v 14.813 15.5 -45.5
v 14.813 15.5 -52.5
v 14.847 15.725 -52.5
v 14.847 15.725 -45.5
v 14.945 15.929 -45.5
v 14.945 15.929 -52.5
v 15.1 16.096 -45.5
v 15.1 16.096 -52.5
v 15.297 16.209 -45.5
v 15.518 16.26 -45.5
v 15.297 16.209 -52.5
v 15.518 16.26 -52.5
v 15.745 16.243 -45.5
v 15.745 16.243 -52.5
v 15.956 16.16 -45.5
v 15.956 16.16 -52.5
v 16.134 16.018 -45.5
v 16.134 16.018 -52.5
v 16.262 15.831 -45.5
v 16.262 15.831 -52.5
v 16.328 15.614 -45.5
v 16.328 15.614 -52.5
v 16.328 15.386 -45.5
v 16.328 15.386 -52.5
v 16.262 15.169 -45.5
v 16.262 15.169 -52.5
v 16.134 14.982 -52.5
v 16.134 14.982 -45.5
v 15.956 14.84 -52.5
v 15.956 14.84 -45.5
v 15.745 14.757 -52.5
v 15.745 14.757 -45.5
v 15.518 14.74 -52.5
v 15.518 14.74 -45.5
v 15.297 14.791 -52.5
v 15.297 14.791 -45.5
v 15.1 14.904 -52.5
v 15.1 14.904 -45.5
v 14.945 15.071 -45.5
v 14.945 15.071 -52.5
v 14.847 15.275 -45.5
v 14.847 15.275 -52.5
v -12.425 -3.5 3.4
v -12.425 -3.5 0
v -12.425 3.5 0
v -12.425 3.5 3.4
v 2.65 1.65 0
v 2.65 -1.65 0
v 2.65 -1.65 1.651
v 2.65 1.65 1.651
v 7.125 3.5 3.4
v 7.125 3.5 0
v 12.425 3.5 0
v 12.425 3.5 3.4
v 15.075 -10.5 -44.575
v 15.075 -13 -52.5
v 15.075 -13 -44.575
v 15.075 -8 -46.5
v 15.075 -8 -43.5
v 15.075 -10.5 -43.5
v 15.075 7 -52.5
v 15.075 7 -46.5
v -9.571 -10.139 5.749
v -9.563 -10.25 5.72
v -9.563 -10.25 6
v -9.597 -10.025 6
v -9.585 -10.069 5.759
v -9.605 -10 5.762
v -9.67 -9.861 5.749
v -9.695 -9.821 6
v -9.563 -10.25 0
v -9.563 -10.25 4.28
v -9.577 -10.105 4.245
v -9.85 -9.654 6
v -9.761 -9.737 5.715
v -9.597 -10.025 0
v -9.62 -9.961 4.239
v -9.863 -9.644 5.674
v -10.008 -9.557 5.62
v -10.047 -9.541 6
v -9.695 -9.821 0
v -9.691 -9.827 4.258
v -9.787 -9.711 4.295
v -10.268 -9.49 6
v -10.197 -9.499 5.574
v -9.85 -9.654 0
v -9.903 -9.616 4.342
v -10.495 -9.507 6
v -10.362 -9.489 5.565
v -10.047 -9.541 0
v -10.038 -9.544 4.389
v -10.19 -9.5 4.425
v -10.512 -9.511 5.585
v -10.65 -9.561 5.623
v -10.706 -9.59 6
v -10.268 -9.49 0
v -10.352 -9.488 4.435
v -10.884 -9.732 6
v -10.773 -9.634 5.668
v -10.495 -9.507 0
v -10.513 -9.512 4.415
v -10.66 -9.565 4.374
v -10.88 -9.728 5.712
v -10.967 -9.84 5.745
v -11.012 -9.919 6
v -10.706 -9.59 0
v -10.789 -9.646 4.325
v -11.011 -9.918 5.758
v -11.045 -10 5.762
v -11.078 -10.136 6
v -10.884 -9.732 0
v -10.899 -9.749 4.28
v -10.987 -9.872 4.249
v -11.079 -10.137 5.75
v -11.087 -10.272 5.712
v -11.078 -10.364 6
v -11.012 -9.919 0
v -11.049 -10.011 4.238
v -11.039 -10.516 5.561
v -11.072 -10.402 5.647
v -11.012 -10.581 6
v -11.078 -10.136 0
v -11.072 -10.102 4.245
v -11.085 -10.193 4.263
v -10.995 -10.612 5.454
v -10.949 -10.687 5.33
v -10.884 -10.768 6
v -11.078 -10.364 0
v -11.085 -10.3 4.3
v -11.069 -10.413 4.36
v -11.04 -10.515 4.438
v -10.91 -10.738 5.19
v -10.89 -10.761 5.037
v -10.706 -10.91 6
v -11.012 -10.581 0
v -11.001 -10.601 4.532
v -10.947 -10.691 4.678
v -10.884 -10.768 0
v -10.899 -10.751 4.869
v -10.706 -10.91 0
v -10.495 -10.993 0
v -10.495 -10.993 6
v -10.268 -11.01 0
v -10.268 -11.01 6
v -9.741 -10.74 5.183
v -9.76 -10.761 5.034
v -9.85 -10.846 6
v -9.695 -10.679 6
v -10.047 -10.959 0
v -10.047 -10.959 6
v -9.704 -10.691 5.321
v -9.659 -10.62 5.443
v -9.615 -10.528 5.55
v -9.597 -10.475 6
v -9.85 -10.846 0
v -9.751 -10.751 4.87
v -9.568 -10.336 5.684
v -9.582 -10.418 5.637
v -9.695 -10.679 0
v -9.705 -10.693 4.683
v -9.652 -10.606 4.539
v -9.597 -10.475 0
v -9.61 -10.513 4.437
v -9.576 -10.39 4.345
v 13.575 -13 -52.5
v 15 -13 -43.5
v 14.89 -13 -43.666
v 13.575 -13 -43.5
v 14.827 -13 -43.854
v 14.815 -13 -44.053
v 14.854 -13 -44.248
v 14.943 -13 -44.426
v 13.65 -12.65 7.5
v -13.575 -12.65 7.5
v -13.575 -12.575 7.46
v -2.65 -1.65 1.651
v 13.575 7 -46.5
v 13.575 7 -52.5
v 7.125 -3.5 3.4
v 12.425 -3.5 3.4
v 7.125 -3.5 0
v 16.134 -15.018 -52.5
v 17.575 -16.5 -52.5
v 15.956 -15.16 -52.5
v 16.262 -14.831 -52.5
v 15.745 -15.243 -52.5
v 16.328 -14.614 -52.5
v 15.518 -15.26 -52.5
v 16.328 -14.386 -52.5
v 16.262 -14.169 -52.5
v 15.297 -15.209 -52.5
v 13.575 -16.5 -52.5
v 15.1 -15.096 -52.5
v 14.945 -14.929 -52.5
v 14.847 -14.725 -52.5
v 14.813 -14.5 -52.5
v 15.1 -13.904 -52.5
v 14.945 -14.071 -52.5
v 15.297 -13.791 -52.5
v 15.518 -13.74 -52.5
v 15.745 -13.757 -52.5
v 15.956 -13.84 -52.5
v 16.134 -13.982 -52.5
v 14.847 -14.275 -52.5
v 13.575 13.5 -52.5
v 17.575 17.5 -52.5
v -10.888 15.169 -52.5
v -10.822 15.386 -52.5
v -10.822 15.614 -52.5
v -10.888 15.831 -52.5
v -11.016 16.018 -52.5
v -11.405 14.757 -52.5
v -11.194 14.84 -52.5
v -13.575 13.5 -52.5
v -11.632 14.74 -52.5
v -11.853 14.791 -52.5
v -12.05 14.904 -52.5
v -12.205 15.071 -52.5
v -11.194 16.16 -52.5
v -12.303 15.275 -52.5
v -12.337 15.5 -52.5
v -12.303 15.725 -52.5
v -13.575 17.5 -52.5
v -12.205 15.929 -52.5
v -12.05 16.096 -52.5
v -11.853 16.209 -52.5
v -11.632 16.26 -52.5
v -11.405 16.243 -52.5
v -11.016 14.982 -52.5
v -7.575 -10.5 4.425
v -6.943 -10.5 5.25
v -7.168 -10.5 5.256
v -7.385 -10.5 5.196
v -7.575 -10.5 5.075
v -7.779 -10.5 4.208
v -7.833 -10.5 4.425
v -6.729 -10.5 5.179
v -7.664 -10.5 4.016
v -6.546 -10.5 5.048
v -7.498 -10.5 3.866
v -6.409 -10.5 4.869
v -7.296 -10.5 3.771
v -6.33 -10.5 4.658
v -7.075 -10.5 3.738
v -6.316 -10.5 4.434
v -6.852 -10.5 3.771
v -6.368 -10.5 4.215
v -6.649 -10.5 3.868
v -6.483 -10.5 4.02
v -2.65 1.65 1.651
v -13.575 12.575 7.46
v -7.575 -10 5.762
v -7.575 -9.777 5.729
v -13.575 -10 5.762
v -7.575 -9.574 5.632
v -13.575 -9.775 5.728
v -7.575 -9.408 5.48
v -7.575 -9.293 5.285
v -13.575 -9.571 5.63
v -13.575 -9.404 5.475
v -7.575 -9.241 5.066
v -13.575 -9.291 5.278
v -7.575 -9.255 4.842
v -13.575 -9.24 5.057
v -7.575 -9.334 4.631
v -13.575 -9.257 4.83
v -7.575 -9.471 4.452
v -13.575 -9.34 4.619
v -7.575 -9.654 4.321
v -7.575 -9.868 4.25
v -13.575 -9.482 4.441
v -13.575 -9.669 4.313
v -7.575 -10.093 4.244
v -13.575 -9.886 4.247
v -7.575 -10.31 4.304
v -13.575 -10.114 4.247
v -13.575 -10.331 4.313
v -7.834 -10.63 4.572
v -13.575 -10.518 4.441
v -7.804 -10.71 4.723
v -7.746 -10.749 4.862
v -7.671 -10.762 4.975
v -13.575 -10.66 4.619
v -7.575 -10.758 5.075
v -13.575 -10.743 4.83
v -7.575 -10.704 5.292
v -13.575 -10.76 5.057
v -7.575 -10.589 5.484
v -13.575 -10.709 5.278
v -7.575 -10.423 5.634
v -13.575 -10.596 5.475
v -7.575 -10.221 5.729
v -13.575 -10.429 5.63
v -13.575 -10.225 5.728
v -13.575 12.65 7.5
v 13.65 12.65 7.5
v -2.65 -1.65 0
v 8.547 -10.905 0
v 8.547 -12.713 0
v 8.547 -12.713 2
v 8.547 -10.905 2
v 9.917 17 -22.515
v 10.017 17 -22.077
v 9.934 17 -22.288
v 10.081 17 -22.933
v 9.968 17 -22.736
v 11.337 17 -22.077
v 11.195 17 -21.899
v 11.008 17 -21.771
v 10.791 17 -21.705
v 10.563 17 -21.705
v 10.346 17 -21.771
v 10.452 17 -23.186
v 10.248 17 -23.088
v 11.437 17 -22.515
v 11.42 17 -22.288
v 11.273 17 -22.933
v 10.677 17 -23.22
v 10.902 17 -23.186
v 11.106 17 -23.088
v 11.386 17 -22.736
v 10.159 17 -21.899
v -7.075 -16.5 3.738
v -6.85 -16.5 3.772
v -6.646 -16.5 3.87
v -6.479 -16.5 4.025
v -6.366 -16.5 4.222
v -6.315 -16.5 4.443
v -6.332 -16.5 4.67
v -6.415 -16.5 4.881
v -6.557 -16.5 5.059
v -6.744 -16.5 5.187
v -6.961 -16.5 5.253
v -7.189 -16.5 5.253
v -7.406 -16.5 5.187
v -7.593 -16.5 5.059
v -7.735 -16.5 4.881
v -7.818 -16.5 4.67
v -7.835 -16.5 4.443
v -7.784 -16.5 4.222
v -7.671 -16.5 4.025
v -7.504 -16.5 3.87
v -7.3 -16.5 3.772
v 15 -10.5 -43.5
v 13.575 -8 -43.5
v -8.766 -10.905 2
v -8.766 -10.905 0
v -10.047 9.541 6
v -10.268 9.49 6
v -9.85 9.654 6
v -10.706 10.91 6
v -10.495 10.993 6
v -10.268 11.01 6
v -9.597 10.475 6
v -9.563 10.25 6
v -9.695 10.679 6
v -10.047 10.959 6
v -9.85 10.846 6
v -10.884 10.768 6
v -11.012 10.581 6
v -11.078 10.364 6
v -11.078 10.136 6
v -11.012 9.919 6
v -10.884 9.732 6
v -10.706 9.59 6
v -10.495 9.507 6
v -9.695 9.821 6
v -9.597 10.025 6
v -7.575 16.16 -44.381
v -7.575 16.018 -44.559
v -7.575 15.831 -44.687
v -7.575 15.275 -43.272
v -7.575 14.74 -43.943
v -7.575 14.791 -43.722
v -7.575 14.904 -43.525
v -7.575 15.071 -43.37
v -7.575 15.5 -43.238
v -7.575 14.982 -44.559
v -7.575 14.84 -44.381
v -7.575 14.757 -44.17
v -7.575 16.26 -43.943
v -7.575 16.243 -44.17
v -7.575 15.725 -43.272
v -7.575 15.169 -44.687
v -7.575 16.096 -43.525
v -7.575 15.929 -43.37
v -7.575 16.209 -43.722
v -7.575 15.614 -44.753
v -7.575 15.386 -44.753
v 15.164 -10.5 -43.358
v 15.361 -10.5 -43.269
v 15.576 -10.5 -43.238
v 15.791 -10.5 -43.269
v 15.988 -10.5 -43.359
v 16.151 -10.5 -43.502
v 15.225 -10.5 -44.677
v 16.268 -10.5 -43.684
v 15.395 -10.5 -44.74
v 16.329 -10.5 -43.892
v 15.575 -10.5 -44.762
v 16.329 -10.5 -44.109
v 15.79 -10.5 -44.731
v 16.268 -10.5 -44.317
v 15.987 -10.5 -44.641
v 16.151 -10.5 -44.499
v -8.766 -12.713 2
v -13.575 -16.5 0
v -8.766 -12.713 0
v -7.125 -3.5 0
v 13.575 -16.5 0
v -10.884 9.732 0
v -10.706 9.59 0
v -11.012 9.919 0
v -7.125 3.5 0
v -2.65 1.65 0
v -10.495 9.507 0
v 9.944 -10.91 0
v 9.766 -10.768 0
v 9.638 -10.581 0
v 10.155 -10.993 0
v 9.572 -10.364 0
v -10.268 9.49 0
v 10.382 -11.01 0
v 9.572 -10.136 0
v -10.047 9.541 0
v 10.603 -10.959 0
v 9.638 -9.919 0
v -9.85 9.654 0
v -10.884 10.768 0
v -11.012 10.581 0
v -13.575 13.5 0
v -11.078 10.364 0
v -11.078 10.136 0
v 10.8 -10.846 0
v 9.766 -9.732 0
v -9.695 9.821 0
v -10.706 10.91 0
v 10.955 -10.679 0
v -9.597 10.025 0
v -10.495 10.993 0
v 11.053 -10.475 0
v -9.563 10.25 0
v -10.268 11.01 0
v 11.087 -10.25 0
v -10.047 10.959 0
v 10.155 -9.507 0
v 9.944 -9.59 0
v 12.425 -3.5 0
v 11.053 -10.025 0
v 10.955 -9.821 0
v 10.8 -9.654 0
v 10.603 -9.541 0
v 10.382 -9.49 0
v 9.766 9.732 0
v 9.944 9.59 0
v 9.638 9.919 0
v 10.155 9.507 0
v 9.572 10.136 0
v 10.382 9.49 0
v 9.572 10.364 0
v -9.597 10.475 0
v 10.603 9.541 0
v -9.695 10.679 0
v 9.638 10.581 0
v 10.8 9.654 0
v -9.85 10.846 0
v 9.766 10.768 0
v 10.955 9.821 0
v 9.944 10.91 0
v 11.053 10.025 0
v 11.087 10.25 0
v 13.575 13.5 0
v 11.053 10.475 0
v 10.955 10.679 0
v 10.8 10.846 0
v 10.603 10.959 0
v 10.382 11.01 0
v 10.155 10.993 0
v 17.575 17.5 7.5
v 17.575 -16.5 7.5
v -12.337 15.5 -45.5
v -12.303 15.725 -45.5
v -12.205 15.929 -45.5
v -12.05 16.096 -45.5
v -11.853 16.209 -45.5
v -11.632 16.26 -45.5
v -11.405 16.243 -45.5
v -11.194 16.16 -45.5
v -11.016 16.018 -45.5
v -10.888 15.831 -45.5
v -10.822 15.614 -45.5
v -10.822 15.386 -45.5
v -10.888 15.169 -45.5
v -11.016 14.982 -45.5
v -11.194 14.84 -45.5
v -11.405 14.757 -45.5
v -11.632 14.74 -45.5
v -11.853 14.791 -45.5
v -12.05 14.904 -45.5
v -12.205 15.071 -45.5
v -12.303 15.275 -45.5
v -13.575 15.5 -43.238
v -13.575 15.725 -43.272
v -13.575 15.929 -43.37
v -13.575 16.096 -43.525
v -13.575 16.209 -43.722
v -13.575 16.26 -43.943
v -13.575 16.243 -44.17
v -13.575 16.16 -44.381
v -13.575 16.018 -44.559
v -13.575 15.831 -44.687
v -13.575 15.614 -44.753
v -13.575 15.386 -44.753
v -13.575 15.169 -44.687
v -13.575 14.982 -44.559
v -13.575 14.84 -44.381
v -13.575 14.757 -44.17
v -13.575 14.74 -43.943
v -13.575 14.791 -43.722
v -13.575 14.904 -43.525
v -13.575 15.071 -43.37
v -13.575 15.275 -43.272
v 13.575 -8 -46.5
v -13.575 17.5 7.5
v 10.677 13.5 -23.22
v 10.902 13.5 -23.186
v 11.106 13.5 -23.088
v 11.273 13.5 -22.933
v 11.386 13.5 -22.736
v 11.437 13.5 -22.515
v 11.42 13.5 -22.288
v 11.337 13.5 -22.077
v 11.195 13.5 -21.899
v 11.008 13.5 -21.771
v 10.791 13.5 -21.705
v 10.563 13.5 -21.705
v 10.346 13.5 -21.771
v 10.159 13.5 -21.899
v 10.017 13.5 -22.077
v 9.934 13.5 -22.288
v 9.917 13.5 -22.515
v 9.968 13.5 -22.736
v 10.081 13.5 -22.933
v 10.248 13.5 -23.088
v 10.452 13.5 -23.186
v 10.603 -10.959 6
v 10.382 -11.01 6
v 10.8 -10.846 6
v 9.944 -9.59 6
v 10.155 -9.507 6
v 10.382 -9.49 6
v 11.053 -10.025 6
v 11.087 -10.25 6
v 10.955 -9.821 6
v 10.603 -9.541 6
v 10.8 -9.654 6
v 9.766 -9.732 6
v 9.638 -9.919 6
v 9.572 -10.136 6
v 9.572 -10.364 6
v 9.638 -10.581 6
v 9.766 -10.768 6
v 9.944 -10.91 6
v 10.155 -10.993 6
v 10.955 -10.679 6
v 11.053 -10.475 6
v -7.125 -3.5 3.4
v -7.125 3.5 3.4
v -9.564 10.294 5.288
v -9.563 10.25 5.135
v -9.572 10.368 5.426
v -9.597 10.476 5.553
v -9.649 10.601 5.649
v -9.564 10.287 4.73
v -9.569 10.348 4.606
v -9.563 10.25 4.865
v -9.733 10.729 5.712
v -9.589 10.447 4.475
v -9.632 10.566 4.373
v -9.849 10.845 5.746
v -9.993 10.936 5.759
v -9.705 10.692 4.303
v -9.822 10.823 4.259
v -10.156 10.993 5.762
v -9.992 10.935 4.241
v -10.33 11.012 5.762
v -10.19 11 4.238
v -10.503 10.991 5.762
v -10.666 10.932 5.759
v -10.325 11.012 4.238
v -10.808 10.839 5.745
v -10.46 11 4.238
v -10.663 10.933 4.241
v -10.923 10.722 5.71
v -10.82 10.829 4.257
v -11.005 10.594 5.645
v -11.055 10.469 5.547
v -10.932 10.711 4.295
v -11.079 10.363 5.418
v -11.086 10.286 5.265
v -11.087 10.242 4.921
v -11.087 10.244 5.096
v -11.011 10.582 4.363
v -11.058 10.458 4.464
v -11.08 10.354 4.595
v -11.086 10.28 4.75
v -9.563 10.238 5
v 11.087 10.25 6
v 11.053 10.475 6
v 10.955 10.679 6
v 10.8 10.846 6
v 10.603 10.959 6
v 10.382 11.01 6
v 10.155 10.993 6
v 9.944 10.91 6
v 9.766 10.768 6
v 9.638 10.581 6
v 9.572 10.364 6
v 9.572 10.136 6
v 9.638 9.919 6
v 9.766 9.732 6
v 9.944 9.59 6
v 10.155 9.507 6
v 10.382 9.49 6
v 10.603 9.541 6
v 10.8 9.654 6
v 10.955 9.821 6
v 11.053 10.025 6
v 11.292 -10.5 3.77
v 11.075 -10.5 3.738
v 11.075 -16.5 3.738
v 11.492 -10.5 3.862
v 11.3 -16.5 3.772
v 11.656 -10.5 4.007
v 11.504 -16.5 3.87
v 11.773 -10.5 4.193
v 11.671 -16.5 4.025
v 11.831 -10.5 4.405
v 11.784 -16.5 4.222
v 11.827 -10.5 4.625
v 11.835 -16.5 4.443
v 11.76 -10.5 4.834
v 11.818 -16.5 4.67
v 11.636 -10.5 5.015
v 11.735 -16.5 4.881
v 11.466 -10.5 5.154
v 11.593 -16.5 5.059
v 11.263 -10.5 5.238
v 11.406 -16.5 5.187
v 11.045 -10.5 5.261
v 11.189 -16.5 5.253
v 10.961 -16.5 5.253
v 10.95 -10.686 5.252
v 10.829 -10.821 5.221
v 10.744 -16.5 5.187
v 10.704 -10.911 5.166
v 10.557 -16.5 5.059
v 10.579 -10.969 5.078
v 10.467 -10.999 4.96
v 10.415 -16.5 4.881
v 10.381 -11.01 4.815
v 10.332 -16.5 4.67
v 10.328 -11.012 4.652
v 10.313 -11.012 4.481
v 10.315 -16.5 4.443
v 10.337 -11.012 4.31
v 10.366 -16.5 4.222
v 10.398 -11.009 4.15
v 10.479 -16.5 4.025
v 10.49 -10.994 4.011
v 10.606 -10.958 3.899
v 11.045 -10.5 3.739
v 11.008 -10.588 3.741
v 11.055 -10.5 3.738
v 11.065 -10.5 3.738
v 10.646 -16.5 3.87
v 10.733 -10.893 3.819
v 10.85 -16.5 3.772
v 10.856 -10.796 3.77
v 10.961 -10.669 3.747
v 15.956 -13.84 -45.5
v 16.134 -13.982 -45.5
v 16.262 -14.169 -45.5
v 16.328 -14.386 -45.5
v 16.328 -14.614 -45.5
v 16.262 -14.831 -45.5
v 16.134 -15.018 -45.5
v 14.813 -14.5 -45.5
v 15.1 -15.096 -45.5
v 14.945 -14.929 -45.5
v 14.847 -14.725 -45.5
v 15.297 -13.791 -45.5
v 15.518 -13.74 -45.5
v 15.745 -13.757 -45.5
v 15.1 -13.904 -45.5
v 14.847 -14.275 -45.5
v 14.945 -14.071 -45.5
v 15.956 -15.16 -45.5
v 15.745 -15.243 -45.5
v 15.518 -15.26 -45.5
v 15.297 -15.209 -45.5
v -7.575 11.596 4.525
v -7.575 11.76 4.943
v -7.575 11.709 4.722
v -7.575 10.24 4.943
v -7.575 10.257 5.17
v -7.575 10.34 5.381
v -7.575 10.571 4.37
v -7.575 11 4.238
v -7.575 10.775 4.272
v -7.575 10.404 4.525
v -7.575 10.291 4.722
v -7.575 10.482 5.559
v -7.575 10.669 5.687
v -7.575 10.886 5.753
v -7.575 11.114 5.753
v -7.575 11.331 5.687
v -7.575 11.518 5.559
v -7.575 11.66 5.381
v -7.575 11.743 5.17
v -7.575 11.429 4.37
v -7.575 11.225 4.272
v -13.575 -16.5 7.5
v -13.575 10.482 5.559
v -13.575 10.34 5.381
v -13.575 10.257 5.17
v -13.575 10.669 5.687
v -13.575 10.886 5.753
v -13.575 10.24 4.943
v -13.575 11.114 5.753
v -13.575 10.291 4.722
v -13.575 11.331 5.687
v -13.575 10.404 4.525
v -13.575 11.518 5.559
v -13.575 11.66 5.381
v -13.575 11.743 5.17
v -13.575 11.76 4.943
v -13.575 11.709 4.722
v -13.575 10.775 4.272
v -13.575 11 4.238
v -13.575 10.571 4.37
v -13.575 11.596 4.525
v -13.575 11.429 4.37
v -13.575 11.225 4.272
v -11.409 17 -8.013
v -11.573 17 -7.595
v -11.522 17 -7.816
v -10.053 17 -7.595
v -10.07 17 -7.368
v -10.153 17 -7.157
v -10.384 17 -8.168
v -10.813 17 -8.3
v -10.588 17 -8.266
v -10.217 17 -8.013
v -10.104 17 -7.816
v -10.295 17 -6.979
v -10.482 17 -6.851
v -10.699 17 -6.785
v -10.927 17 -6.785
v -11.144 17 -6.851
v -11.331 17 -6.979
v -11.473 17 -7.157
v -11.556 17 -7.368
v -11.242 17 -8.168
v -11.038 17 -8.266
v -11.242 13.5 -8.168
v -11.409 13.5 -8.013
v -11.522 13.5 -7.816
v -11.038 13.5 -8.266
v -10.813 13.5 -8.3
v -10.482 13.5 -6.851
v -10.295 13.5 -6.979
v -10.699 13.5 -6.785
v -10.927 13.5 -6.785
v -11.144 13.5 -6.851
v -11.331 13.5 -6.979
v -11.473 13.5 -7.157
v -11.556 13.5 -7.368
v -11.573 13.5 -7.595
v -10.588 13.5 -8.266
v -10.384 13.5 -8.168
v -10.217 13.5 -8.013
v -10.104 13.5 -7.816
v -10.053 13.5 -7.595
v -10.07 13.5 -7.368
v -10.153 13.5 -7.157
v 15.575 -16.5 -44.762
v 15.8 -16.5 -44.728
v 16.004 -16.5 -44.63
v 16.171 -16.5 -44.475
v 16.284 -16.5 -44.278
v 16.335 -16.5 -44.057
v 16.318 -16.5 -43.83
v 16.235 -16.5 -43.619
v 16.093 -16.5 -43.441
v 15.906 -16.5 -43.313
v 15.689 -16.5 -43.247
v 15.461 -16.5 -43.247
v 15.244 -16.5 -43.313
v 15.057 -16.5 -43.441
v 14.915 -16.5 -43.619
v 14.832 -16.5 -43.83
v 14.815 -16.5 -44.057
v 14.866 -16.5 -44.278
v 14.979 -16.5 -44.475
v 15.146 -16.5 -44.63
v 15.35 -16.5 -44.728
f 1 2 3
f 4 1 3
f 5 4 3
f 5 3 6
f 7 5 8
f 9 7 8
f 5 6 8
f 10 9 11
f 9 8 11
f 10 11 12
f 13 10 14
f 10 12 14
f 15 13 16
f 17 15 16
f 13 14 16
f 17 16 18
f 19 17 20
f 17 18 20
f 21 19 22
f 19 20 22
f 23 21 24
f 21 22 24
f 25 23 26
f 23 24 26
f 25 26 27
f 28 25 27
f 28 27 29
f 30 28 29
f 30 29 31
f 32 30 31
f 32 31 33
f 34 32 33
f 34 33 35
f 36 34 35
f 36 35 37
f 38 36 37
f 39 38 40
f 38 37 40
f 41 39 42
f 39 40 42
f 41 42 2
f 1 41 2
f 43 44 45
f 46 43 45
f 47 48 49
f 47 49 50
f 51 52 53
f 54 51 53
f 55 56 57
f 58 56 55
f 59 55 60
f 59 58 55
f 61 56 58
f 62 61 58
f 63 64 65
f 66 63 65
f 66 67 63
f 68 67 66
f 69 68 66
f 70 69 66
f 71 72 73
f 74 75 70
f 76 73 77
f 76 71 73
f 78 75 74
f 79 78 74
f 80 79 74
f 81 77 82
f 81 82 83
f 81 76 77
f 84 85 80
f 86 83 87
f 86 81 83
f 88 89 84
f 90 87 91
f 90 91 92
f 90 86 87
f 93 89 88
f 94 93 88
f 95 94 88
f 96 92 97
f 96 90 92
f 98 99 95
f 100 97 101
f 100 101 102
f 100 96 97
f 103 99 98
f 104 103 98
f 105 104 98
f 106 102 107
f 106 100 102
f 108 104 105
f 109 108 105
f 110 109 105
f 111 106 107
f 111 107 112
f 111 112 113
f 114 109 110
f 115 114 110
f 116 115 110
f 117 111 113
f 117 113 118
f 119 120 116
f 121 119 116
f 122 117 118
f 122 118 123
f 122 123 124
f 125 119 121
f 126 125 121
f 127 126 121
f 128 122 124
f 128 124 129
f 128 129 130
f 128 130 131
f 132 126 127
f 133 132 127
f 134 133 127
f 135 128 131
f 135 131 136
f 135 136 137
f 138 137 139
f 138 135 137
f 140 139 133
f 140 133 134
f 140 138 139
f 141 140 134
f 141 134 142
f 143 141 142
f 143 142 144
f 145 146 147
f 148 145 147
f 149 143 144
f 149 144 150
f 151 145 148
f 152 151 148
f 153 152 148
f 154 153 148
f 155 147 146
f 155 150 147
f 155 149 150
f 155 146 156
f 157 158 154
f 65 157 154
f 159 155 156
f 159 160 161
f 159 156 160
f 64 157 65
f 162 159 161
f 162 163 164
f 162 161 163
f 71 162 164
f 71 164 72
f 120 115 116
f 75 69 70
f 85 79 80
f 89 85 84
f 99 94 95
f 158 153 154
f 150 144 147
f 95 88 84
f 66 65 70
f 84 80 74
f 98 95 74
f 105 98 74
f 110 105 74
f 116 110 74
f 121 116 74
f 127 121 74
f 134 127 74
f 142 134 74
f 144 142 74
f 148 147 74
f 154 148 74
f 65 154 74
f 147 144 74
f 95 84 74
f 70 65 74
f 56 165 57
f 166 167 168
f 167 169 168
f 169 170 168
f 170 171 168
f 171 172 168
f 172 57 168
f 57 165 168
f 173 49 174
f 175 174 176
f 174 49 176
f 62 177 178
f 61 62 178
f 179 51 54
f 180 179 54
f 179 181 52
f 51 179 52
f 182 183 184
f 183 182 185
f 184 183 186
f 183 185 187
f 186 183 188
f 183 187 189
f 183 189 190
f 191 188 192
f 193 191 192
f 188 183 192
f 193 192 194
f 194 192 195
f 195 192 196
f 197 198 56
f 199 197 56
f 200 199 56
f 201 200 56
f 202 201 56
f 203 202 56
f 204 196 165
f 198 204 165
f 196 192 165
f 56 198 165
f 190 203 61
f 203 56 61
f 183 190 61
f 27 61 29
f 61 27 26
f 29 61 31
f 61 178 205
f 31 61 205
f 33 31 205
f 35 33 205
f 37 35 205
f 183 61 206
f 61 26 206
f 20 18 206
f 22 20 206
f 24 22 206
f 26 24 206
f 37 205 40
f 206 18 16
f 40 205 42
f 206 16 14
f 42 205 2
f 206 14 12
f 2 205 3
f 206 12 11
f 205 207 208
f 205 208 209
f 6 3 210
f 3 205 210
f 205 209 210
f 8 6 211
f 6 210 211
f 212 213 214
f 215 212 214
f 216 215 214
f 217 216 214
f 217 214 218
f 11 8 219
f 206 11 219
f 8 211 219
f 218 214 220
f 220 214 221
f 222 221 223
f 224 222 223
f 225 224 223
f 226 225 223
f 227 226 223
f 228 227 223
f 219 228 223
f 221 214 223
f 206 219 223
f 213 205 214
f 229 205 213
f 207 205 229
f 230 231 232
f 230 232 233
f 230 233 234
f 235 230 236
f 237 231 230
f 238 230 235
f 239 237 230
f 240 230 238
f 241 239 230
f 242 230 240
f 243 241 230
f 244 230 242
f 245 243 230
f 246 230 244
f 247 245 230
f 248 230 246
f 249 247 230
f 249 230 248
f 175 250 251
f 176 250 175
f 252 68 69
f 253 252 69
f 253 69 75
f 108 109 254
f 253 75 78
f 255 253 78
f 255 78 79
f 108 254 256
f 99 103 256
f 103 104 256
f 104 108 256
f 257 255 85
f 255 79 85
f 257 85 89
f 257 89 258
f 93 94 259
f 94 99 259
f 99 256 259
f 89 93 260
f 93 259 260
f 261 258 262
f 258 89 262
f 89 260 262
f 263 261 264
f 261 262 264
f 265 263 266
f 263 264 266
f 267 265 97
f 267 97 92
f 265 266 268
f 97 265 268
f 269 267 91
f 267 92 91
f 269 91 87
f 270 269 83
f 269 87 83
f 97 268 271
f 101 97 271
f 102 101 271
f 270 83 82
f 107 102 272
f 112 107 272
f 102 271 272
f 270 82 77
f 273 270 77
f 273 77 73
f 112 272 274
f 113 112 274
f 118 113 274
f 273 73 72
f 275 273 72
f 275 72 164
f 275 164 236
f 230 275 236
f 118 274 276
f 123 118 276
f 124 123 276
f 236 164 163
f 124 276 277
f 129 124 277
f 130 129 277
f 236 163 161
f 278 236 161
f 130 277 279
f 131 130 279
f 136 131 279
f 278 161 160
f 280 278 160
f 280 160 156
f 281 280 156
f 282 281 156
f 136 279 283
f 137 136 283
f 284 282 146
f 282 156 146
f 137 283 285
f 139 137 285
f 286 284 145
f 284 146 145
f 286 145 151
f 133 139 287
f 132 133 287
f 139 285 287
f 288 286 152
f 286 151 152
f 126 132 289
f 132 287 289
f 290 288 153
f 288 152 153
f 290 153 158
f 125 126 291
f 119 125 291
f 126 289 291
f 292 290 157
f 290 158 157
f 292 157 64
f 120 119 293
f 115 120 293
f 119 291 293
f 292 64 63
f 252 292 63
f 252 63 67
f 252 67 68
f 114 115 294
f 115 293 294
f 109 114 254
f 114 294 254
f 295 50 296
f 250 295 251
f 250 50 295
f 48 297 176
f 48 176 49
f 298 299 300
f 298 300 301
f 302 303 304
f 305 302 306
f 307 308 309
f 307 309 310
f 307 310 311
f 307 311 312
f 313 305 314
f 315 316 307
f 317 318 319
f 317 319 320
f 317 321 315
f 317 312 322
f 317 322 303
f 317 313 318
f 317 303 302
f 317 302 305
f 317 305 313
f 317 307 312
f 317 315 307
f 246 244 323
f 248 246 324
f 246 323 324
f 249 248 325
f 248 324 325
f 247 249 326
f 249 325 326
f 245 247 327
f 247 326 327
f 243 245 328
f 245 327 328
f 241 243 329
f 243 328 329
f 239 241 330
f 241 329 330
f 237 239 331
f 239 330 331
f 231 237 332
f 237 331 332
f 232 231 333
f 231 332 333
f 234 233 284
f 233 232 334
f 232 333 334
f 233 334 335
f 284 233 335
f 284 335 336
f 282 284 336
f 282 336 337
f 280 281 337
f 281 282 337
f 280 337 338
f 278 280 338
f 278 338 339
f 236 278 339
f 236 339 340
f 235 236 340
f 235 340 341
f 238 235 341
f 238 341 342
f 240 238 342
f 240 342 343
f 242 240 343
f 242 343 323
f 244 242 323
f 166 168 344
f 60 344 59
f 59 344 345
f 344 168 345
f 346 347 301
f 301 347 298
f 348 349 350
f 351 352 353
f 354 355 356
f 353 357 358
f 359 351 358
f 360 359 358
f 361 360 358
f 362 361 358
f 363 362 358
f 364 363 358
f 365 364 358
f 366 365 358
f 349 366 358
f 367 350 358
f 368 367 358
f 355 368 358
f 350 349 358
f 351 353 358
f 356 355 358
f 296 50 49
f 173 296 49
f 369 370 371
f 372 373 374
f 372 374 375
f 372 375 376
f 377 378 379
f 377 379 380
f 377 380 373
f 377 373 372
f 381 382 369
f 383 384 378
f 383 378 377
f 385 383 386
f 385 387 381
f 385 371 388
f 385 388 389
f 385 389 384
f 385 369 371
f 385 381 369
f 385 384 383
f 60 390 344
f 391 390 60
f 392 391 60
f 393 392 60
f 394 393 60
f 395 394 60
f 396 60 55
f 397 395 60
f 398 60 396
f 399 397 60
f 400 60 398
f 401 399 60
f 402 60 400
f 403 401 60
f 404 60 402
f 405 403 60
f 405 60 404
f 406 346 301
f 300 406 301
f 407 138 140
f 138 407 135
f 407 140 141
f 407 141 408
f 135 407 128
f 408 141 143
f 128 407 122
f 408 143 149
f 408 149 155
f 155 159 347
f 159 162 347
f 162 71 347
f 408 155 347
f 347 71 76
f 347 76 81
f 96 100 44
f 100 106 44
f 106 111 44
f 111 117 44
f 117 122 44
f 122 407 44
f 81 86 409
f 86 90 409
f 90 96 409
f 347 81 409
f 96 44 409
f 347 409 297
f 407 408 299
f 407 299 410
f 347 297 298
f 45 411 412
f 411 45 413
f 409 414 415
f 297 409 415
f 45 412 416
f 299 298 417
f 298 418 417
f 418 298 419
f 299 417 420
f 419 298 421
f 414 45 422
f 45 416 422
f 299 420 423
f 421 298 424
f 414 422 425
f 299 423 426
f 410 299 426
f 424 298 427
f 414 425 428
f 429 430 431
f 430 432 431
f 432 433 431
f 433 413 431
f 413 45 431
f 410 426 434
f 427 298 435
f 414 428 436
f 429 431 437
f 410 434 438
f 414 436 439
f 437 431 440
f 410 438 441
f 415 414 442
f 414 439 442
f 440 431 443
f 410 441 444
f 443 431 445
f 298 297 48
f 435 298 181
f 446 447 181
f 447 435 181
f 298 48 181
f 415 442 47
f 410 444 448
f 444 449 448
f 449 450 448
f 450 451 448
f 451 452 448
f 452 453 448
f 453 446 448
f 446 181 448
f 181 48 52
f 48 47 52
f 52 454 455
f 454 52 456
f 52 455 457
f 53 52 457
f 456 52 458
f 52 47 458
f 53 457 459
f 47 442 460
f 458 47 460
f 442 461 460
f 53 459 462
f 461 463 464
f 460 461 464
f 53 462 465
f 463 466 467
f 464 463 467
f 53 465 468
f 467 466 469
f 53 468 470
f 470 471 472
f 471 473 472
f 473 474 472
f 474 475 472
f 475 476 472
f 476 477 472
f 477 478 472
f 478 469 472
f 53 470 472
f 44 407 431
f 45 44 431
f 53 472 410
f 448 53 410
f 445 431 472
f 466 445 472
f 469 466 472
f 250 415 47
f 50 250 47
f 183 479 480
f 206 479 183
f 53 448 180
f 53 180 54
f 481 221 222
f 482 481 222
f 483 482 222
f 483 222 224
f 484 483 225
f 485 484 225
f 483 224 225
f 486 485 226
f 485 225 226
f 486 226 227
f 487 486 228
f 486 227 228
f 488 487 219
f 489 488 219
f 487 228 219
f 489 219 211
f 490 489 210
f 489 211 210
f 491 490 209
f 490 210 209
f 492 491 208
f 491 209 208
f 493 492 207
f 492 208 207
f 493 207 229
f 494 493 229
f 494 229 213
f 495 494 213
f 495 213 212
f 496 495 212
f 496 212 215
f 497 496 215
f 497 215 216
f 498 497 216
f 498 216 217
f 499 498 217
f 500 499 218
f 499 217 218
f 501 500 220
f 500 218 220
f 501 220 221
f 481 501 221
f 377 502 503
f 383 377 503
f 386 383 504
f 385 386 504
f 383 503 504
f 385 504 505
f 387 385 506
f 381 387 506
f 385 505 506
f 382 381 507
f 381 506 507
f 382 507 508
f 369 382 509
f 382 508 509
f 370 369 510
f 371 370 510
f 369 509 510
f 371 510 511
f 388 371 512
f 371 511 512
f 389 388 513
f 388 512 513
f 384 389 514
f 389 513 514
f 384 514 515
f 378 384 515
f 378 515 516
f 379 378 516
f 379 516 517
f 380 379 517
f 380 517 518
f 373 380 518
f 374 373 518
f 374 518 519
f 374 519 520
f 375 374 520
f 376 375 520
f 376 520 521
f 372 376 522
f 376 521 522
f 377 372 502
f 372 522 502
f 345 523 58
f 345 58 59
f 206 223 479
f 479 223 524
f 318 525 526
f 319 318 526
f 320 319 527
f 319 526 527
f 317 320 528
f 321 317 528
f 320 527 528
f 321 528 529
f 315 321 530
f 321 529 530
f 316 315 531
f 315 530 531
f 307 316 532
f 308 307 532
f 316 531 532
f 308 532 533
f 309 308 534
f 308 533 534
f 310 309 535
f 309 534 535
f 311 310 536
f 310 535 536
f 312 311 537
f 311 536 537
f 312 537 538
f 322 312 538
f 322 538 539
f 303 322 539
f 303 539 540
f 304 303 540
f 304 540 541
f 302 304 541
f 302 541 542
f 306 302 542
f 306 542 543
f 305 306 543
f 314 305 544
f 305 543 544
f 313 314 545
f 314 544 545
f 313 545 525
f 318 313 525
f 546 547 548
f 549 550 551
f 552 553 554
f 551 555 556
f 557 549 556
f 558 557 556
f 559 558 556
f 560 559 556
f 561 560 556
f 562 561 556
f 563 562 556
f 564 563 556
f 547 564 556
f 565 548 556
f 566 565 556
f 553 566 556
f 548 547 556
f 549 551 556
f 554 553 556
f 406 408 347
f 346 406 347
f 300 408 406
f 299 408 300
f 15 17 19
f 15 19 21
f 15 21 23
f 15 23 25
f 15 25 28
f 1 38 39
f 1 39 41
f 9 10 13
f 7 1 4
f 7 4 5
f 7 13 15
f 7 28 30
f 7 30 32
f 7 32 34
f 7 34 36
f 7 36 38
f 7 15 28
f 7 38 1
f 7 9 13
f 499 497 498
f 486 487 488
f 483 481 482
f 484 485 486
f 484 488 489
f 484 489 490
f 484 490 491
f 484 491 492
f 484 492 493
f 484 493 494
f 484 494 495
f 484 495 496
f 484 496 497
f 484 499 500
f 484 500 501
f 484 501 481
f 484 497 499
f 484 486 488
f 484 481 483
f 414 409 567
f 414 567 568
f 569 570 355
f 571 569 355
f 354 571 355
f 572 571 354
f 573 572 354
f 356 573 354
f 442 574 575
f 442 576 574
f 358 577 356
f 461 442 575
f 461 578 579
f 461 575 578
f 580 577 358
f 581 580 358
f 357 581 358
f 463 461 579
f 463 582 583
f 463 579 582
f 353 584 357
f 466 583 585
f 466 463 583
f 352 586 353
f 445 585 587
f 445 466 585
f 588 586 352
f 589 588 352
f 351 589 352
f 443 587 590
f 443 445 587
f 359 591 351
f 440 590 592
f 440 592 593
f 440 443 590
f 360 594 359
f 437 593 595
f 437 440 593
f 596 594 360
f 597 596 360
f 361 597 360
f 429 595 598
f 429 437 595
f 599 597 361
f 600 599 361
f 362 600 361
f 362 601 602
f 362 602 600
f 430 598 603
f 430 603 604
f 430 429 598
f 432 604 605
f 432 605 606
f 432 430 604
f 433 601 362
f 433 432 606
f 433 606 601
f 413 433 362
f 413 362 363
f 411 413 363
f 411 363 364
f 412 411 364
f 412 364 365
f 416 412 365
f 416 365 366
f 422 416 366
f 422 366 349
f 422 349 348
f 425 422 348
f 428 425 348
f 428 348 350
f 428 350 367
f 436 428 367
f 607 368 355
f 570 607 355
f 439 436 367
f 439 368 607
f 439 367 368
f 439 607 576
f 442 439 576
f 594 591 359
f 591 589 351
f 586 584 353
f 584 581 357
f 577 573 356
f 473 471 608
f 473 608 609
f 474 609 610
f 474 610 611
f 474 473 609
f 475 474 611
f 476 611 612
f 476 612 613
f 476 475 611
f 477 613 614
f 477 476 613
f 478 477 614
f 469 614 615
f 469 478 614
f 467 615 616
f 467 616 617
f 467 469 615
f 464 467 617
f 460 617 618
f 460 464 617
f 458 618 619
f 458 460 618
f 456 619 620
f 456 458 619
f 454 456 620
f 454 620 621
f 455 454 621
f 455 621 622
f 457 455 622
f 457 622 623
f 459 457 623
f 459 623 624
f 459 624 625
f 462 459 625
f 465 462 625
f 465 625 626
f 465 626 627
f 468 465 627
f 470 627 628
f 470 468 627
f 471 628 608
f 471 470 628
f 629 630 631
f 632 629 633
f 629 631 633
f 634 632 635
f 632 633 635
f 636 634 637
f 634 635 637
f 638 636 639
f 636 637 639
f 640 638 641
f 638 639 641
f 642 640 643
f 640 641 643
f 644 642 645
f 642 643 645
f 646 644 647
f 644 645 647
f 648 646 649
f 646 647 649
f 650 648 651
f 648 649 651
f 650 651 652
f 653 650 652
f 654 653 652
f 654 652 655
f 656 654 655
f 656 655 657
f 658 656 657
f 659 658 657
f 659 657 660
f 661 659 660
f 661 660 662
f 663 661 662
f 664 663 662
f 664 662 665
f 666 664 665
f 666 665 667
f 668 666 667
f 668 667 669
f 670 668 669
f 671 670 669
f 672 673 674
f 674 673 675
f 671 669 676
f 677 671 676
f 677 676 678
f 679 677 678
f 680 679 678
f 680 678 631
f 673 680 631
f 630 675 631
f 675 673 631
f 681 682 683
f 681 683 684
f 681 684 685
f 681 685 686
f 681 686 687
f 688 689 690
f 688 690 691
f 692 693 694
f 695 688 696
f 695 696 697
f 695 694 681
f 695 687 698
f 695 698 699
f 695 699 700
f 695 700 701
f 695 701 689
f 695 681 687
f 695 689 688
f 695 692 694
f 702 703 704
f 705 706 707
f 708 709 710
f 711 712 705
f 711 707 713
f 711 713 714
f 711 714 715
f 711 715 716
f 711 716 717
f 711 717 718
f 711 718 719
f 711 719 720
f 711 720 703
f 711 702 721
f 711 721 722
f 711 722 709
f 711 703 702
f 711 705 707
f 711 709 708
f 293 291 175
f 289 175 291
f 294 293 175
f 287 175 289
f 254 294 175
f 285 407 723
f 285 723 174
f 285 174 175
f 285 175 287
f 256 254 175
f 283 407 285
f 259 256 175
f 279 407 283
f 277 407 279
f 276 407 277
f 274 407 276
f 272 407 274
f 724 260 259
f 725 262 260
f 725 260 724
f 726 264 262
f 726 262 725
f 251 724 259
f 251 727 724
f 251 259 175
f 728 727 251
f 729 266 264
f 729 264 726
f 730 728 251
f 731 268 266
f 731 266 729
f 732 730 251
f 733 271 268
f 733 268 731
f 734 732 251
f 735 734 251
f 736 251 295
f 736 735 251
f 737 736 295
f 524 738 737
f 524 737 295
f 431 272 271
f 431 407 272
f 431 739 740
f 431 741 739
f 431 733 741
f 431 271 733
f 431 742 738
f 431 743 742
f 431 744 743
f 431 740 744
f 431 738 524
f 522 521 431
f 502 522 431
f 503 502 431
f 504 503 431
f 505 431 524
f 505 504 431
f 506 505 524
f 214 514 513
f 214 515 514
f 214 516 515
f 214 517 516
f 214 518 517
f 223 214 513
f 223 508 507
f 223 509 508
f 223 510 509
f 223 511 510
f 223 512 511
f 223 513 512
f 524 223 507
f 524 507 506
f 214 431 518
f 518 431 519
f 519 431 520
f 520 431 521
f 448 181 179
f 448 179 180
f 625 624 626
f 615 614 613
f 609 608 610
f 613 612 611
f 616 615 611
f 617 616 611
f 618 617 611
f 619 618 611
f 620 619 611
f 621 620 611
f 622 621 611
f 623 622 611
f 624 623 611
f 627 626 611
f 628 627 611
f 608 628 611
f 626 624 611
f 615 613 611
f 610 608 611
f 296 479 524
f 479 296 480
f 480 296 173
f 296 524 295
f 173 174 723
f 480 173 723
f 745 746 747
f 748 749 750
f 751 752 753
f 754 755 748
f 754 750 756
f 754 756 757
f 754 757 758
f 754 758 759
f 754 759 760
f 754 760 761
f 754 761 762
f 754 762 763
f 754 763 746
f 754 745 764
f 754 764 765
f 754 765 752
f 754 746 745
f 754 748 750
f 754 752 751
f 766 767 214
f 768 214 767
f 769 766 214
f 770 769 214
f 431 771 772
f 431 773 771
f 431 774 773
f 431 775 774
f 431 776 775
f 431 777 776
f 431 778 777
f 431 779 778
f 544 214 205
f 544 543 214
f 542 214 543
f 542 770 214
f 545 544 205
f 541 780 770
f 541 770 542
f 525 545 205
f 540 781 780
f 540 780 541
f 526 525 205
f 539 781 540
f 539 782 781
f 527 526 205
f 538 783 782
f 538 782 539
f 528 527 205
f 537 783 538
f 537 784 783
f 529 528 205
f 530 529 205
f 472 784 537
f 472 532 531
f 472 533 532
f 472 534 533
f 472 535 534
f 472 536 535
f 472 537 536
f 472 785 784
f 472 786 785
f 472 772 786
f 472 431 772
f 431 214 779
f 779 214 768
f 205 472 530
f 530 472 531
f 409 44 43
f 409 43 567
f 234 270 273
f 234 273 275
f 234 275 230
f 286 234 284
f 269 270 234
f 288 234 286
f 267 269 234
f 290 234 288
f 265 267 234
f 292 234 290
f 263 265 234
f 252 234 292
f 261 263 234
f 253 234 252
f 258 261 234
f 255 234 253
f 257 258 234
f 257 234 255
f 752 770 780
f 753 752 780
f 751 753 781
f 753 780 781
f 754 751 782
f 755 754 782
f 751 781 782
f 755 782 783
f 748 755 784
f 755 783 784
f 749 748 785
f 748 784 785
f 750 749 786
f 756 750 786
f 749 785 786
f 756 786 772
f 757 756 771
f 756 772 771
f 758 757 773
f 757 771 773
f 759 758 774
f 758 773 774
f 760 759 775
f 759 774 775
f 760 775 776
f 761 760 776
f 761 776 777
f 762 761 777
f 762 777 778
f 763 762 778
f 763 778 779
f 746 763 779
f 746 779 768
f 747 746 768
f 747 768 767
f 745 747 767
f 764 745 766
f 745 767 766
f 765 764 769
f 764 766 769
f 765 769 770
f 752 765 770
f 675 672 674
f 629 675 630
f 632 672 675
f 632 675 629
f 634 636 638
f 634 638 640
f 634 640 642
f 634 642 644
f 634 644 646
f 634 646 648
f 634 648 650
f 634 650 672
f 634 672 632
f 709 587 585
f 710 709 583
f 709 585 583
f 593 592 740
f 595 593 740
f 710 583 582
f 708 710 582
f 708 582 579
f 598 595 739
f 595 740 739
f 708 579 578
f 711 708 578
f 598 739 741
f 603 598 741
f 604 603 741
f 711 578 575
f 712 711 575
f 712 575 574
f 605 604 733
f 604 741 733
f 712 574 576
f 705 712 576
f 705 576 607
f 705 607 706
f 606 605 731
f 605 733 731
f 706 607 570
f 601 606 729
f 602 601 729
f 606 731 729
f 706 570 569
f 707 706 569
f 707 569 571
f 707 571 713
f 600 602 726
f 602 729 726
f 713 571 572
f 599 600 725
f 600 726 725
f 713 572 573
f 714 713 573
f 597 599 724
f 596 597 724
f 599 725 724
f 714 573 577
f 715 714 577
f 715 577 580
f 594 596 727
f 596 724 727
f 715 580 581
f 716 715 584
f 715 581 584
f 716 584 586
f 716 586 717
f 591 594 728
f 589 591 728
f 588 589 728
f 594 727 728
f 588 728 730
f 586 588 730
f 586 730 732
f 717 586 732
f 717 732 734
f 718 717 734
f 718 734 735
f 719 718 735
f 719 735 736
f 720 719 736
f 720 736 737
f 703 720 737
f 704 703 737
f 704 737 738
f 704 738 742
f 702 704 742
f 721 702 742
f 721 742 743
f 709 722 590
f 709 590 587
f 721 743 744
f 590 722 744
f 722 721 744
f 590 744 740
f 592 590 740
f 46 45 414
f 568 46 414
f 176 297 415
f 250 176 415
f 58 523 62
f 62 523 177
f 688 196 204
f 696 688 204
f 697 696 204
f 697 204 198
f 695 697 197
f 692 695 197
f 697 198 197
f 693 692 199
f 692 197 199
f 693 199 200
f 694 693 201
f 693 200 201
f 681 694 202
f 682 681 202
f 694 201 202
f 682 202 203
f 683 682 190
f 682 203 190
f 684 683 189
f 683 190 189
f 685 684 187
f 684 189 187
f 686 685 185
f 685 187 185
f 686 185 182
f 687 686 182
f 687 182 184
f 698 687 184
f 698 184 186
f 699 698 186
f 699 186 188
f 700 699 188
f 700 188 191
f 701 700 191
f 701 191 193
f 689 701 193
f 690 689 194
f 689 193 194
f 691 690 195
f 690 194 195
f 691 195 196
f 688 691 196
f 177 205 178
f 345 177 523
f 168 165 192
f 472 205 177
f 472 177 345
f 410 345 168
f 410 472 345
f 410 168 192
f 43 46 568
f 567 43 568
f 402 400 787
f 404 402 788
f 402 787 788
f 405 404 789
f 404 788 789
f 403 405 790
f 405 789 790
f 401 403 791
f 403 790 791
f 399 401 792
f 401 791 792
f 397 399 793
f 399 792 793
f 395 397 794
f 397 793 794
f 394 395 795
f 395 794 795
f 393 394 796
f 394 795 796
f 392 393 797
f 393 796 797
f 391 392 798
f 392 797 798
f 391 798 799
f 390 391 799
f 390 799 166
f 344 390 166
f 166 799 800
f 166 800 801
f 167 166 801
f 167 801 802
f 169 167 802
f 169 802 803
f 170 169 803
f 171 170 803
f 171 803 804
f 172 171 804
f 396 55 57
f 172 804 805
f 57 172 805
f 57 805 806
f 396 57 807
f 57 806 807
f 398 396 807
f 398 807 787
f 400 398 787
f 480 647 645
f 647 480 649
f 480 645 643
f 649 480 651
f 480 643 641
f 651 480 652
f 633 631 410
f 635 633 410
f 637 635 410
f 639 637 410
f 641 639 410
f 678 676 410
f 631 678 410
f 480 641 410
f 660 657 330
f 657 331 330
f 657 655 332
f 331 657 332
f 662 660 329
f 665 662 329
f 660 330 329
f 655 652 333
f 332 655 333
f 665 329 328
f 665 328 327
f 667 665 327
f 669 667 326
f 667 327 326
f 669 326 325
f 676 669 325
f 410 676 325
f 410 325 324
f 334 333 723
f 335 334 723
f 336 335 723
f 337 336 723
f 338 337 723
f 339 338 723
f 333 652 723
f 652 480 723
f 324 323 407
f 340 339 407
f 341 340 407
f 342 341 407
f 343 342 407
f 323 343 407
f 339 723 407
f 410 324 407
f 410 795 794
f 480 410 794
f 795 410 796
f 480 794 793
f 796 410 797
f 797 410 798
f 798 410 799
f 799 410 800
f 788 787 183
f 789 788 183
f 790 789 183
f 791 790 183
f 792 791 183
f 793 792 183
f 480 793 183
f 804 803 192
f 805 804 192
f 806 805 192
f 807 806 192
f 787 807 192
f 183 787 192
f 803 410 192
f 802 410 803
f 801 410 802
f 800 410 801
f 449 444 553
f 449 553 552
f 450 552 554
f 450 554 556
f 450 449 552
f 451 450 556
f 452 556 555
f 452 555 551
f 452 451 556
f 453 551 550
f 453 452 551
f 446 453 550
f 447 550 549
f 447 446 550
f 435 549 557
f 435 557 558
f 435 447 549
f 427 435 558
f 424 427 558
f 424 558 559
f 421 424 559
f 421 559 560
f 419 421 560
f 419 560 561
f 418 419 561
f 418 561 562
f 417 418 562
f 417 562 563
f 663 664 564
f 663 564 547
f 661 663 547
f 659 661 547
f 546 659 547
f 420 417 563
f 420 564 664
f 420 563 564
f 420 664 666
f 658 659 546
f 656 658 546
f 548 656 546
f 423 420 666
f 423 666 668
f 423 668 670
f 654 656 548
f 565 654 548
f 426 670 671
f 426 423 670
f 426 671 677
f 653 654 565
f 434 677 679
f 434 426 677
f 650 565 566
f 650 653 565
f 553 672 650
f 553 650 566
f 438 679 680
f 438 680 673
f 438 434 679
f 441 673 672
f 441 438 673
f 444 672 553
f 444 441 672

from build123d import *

# Parameters (mm, degrees)
SKETCH2_W           = 33.15
SKETCH2_H           = 33
BOSS_EXTRUDE1_DEPTH = 7.5
SKETCH3_R           = 0.762
CUT_EXTRUDE1_DEPTH  = 6
SKETCH4_W           = 5.3
SKETCH4_H           = 7
CUT_EXTRUDE2_DEPTH  = 3.4
SKETCH5_W           = 17.312690108
SKETCH5_H           = 1.808425299
CUT_EXTRUDE3_DEPTH  = 2
SKETCH6_W           = 5.3
SKETCH6_H           = 3.3
CUT_EXTRUDE4_DEPTH  = 25.560753755
CHAMFER3_SIZE       = 11
CHAMFER3_SIZE2      = 5.848803748
BOSS_EXTRUDE2_DEPTH = 52.5
SKETCH8_W           = 33.15
SKETCH8_H           = 60
BOSS_EXTRUDE3_DEPTH = 1
SKETCH9_W           = 3
SKETCH9_H           = 34
CUT_EXTRUDE5_DEPTH  = 60
SKETCH10_R          = 0.762
CUT_EXTRUDE6_DEPTH  = 6
SKETCH11_R          = 0.762
CUT_EXTRUDE7_DEPTH  = 6
SKETCH12_R          = 0.762
CUT_EXTRUDE9_DEPTH  = 7
SKETCH13_W          = 3
SKETCH13_H          = 5
CUT_EXTRUDE10_DEPTH = 1.5
SKETCH14_W          = 52.5
SKETCH14_H          = 1
BOSS_EXTRUDE4_DEPTH = 1
SKETCH15_R          = 0.762
CUT_EXTRUDE11_DEPTH = 3.5


with BuildPart() as part:
    # Sketch2 → Boss-Extrude1 (new body)
    with BuildSketch(Plane.XY):
        Rectangle(SKETCH2_W, SKETCH2_H)
    extrude(amount=BOSS_EXTRUDE1_DEPTH)

    # Sketch3 → Cut-Extrude1 (cut)
    with BuildSketch(Plane.XY):
        with Locations((10.325, 10.25)):
            Circle(SKETCH3_R)
        with Locations((-10.325, 10.25)):
            Circle(SKETCH3_R)
        with Locations((10.325, -10.25)):
            Circle(SKETCH3_R)
        with Locations((-10.325, -10.25)):
            Circle(SKETCH3_R)
    extrude(amount=CUT_EXTRUDE1_DEPTH, mode=Mode.SUBTRACT)

    # Sketch4 → Cut-Extrude2 (cut)
    with BuildSketch(Plane.XY):
        with Locations((9.775, 0)):
            Rectangle(SKETCH4_W, SKETCH4_H)
        with Locations((-9.775, 0)):
            Rectangle(SKETCH4_W, SKETCH4_H)
    extrude(amount=CUT_EXTRUDE2_DEPTH, mode=Mode.SUBTRACT)

    # Sketch5 → Cut-Extrude3 (cut)
    with BuildSketch(Plane.XY):
        with Locations((-0.109621432, -11.80915301)):
            Rectangle(SKETCH5_W, SKETCH5_H)
    extrude(amount=CUT_EXTRUDE3_DEPTH, mode=Mode.SUBTRACT)

    # Sketch6 → Cut-Extrude4 (cut, through all)
    with BuildSketch(Plane.XY):
        Rectangle(SKETCH6_W, SKETCH6_H)
    extrude(amount=CUT_EXTRUDE4_DEPTH, mode=Mode.SUBTRACT)

    # Chamfer3
    chamfer3_edges = [part.edges().sort_by_distance(p)[0] for p in [
        (2.65, 0, 7.5),
        (0, 1.65, 7.5),
        (-2.65, 0, 7.5),
        (0, -1.65, 7.5),
    ]]
    chamfer3_side = [part.faces().sort_by_distance(p)[0] for p in [
        (-16.107247662, 0, 7.5),
    ]]
    chamfer(chamfer3_edges, length=CHAMFER3_SIZE, length2=CHAMFER3_SIZE2, reference=chamfer3_side[0])

    # Sketch7 → Boss-Extrude2 (add)
    with BuildSketch(Plane.XY):
        Polygon((13.575, -16.5), (17.575, -16.5), (17.575, 16.5), (-16.575, 16.5), (-16.575, -16.5), (-13.575, -16.5), (-13.575, 13.5), (13.575, 13.5), align=None)
    extrude(amount=-BOSS_EXTRUDE2_DEPTH)

    # Sketch8 → Boss-Extrude3 (add)
    with BuildSketch(Plane(origin=(0, 16.5, 0), x_dir=(1, 0, 0), z_dir=(0, 1, 0))):
        with Locations((0, 22.5)):
            Rectangle(SKETCH8_W, SKETCH8_H)
    extrude(amount=BOSS_EXTRUDE3_DEPTH)

    # Sketch9 → Cut-Extrude5 (cut)
    with BuildSketch(Plane(origin=(0, 0, -52.5), x_dir=(-1, 0, 0), z_dir=(0, 0, -1))):
        with Locations((15.075, 0.5)):
            Rectangle(SKETCH9_W, SKETCH9_H)
    extrude(amount=-CUT_EXTRUDE5_DEPTH, mode=Mode.SUBTRACT)

    # Sketch10 → Cut-Extrude6 (cut)
    with BuildSketch(Plane.ZY.offset(13.575)):
        with Locations((-44, 15.5)):
            Circle(SKETCH10_R)
        with Locations(Location((5, 11, 0), (0, 0, 180))):
            Circle(SKETCH10_R)
        with Locations((5, -10)):
            Circle(SKETCH10_R)
    extrude(amount=-CUT_EXTRUDE6_DEPTH, mode=Mode.SUBTRACT)

    # Sketch11 → Cut-Extrude7 (cut)
    with BuildSketch(Plane(origin=(0, -16.5, 0), x_dir=(-1, 0, 0), z_dir=(0, -1, 0))):
        with Locations(Location((-15.575, 44, 0), (0, 0, 90))):
            Circle(SKETCH11_R)
        with Locations((-15.575, -51.5)):
            Circle(SKETCH11_R)
        with Locations(Location((7.075, -4.5, 0), (0, 0, 90))):
            Circle(SKETCH11_R)
        with Locations(Location((-11.075, -4.5, 0), (0, 0, 90))):
            Circle(SKETCH11_R)
    extrude(amount=-CUT_EXTRUDE7_DEPTH, mode=Mode.SUBTRACT)

    # Sketch12 → Cut-Extrude9 (cut)
    with BuildSketch(Plane(origin=(0, 0, -52.5), x_dir=(-1, 0, 0), z_dir=(0, 0, -1))):
        with Locations((-15.575, 15.5)):
            Circle(SKETCH12_R)
        with Locations((-15.575, -14.5)):
            Circle(SKETCH12_R)
        with Locations((11.575, 15.5)):
            Circle(SKETCH12_R)
    extrude(amount=-CUT_EXTRUDE9_DEPTH, mode=Mode.SUBTRACT)

    # Sketch13 → Cut-Extrude10 (cut)
    with BuildSketch(Plane.ZY.offset(-13.575)):
        Polygon((-46.5, 7), (-52.5, 7), (-52.5, -13), (-46.5, -13), (-46.5, -8), align=None)
        with Locations((-45, -10.5)):
            Rectangle(SKETCH13_W, SKETCH13_H)
    extrude(amount=-CUT_EXTRUDE10_DEPTH, mode=Mode.SUBTRACT)

    # Sketch14 → Boss-Extrude4 (add)
    with BuildSketch(Plane(origin=(16.575, 0, 0), x_dir=(0, 0, -1), z_dir=(1, 0, 0))):
        Polygon((0, 17.5), (-7.5, 17.5), (-7.5, -16.5), (0, -16.5), (0, 16.5), align=None)
        with Locations((26.25, 17)):
            Rectangle(SKETCH14_W, SKETCH14_H)
    extrude(amount=BOSS_EXTRUDE4_DEPTH)

    # Sketch15 → Cut-Extrude11 (cut)
    with BuildSketch(Plane.XZ.offset(-13.5)):
        with Locations(Location((-10.813, -7.538, 0), (0, 0, 270))):
            Circle(SKETCH15_R)
        with Locations(Location((10.677, -22.458, 0), (0, 0, 270))):
            Circle(SKETCH15_R)
    extrude(amount=-CUT_EXTRUDE11_DEPTH, mode=Mode.SUBTRACT)


solid = part.part
